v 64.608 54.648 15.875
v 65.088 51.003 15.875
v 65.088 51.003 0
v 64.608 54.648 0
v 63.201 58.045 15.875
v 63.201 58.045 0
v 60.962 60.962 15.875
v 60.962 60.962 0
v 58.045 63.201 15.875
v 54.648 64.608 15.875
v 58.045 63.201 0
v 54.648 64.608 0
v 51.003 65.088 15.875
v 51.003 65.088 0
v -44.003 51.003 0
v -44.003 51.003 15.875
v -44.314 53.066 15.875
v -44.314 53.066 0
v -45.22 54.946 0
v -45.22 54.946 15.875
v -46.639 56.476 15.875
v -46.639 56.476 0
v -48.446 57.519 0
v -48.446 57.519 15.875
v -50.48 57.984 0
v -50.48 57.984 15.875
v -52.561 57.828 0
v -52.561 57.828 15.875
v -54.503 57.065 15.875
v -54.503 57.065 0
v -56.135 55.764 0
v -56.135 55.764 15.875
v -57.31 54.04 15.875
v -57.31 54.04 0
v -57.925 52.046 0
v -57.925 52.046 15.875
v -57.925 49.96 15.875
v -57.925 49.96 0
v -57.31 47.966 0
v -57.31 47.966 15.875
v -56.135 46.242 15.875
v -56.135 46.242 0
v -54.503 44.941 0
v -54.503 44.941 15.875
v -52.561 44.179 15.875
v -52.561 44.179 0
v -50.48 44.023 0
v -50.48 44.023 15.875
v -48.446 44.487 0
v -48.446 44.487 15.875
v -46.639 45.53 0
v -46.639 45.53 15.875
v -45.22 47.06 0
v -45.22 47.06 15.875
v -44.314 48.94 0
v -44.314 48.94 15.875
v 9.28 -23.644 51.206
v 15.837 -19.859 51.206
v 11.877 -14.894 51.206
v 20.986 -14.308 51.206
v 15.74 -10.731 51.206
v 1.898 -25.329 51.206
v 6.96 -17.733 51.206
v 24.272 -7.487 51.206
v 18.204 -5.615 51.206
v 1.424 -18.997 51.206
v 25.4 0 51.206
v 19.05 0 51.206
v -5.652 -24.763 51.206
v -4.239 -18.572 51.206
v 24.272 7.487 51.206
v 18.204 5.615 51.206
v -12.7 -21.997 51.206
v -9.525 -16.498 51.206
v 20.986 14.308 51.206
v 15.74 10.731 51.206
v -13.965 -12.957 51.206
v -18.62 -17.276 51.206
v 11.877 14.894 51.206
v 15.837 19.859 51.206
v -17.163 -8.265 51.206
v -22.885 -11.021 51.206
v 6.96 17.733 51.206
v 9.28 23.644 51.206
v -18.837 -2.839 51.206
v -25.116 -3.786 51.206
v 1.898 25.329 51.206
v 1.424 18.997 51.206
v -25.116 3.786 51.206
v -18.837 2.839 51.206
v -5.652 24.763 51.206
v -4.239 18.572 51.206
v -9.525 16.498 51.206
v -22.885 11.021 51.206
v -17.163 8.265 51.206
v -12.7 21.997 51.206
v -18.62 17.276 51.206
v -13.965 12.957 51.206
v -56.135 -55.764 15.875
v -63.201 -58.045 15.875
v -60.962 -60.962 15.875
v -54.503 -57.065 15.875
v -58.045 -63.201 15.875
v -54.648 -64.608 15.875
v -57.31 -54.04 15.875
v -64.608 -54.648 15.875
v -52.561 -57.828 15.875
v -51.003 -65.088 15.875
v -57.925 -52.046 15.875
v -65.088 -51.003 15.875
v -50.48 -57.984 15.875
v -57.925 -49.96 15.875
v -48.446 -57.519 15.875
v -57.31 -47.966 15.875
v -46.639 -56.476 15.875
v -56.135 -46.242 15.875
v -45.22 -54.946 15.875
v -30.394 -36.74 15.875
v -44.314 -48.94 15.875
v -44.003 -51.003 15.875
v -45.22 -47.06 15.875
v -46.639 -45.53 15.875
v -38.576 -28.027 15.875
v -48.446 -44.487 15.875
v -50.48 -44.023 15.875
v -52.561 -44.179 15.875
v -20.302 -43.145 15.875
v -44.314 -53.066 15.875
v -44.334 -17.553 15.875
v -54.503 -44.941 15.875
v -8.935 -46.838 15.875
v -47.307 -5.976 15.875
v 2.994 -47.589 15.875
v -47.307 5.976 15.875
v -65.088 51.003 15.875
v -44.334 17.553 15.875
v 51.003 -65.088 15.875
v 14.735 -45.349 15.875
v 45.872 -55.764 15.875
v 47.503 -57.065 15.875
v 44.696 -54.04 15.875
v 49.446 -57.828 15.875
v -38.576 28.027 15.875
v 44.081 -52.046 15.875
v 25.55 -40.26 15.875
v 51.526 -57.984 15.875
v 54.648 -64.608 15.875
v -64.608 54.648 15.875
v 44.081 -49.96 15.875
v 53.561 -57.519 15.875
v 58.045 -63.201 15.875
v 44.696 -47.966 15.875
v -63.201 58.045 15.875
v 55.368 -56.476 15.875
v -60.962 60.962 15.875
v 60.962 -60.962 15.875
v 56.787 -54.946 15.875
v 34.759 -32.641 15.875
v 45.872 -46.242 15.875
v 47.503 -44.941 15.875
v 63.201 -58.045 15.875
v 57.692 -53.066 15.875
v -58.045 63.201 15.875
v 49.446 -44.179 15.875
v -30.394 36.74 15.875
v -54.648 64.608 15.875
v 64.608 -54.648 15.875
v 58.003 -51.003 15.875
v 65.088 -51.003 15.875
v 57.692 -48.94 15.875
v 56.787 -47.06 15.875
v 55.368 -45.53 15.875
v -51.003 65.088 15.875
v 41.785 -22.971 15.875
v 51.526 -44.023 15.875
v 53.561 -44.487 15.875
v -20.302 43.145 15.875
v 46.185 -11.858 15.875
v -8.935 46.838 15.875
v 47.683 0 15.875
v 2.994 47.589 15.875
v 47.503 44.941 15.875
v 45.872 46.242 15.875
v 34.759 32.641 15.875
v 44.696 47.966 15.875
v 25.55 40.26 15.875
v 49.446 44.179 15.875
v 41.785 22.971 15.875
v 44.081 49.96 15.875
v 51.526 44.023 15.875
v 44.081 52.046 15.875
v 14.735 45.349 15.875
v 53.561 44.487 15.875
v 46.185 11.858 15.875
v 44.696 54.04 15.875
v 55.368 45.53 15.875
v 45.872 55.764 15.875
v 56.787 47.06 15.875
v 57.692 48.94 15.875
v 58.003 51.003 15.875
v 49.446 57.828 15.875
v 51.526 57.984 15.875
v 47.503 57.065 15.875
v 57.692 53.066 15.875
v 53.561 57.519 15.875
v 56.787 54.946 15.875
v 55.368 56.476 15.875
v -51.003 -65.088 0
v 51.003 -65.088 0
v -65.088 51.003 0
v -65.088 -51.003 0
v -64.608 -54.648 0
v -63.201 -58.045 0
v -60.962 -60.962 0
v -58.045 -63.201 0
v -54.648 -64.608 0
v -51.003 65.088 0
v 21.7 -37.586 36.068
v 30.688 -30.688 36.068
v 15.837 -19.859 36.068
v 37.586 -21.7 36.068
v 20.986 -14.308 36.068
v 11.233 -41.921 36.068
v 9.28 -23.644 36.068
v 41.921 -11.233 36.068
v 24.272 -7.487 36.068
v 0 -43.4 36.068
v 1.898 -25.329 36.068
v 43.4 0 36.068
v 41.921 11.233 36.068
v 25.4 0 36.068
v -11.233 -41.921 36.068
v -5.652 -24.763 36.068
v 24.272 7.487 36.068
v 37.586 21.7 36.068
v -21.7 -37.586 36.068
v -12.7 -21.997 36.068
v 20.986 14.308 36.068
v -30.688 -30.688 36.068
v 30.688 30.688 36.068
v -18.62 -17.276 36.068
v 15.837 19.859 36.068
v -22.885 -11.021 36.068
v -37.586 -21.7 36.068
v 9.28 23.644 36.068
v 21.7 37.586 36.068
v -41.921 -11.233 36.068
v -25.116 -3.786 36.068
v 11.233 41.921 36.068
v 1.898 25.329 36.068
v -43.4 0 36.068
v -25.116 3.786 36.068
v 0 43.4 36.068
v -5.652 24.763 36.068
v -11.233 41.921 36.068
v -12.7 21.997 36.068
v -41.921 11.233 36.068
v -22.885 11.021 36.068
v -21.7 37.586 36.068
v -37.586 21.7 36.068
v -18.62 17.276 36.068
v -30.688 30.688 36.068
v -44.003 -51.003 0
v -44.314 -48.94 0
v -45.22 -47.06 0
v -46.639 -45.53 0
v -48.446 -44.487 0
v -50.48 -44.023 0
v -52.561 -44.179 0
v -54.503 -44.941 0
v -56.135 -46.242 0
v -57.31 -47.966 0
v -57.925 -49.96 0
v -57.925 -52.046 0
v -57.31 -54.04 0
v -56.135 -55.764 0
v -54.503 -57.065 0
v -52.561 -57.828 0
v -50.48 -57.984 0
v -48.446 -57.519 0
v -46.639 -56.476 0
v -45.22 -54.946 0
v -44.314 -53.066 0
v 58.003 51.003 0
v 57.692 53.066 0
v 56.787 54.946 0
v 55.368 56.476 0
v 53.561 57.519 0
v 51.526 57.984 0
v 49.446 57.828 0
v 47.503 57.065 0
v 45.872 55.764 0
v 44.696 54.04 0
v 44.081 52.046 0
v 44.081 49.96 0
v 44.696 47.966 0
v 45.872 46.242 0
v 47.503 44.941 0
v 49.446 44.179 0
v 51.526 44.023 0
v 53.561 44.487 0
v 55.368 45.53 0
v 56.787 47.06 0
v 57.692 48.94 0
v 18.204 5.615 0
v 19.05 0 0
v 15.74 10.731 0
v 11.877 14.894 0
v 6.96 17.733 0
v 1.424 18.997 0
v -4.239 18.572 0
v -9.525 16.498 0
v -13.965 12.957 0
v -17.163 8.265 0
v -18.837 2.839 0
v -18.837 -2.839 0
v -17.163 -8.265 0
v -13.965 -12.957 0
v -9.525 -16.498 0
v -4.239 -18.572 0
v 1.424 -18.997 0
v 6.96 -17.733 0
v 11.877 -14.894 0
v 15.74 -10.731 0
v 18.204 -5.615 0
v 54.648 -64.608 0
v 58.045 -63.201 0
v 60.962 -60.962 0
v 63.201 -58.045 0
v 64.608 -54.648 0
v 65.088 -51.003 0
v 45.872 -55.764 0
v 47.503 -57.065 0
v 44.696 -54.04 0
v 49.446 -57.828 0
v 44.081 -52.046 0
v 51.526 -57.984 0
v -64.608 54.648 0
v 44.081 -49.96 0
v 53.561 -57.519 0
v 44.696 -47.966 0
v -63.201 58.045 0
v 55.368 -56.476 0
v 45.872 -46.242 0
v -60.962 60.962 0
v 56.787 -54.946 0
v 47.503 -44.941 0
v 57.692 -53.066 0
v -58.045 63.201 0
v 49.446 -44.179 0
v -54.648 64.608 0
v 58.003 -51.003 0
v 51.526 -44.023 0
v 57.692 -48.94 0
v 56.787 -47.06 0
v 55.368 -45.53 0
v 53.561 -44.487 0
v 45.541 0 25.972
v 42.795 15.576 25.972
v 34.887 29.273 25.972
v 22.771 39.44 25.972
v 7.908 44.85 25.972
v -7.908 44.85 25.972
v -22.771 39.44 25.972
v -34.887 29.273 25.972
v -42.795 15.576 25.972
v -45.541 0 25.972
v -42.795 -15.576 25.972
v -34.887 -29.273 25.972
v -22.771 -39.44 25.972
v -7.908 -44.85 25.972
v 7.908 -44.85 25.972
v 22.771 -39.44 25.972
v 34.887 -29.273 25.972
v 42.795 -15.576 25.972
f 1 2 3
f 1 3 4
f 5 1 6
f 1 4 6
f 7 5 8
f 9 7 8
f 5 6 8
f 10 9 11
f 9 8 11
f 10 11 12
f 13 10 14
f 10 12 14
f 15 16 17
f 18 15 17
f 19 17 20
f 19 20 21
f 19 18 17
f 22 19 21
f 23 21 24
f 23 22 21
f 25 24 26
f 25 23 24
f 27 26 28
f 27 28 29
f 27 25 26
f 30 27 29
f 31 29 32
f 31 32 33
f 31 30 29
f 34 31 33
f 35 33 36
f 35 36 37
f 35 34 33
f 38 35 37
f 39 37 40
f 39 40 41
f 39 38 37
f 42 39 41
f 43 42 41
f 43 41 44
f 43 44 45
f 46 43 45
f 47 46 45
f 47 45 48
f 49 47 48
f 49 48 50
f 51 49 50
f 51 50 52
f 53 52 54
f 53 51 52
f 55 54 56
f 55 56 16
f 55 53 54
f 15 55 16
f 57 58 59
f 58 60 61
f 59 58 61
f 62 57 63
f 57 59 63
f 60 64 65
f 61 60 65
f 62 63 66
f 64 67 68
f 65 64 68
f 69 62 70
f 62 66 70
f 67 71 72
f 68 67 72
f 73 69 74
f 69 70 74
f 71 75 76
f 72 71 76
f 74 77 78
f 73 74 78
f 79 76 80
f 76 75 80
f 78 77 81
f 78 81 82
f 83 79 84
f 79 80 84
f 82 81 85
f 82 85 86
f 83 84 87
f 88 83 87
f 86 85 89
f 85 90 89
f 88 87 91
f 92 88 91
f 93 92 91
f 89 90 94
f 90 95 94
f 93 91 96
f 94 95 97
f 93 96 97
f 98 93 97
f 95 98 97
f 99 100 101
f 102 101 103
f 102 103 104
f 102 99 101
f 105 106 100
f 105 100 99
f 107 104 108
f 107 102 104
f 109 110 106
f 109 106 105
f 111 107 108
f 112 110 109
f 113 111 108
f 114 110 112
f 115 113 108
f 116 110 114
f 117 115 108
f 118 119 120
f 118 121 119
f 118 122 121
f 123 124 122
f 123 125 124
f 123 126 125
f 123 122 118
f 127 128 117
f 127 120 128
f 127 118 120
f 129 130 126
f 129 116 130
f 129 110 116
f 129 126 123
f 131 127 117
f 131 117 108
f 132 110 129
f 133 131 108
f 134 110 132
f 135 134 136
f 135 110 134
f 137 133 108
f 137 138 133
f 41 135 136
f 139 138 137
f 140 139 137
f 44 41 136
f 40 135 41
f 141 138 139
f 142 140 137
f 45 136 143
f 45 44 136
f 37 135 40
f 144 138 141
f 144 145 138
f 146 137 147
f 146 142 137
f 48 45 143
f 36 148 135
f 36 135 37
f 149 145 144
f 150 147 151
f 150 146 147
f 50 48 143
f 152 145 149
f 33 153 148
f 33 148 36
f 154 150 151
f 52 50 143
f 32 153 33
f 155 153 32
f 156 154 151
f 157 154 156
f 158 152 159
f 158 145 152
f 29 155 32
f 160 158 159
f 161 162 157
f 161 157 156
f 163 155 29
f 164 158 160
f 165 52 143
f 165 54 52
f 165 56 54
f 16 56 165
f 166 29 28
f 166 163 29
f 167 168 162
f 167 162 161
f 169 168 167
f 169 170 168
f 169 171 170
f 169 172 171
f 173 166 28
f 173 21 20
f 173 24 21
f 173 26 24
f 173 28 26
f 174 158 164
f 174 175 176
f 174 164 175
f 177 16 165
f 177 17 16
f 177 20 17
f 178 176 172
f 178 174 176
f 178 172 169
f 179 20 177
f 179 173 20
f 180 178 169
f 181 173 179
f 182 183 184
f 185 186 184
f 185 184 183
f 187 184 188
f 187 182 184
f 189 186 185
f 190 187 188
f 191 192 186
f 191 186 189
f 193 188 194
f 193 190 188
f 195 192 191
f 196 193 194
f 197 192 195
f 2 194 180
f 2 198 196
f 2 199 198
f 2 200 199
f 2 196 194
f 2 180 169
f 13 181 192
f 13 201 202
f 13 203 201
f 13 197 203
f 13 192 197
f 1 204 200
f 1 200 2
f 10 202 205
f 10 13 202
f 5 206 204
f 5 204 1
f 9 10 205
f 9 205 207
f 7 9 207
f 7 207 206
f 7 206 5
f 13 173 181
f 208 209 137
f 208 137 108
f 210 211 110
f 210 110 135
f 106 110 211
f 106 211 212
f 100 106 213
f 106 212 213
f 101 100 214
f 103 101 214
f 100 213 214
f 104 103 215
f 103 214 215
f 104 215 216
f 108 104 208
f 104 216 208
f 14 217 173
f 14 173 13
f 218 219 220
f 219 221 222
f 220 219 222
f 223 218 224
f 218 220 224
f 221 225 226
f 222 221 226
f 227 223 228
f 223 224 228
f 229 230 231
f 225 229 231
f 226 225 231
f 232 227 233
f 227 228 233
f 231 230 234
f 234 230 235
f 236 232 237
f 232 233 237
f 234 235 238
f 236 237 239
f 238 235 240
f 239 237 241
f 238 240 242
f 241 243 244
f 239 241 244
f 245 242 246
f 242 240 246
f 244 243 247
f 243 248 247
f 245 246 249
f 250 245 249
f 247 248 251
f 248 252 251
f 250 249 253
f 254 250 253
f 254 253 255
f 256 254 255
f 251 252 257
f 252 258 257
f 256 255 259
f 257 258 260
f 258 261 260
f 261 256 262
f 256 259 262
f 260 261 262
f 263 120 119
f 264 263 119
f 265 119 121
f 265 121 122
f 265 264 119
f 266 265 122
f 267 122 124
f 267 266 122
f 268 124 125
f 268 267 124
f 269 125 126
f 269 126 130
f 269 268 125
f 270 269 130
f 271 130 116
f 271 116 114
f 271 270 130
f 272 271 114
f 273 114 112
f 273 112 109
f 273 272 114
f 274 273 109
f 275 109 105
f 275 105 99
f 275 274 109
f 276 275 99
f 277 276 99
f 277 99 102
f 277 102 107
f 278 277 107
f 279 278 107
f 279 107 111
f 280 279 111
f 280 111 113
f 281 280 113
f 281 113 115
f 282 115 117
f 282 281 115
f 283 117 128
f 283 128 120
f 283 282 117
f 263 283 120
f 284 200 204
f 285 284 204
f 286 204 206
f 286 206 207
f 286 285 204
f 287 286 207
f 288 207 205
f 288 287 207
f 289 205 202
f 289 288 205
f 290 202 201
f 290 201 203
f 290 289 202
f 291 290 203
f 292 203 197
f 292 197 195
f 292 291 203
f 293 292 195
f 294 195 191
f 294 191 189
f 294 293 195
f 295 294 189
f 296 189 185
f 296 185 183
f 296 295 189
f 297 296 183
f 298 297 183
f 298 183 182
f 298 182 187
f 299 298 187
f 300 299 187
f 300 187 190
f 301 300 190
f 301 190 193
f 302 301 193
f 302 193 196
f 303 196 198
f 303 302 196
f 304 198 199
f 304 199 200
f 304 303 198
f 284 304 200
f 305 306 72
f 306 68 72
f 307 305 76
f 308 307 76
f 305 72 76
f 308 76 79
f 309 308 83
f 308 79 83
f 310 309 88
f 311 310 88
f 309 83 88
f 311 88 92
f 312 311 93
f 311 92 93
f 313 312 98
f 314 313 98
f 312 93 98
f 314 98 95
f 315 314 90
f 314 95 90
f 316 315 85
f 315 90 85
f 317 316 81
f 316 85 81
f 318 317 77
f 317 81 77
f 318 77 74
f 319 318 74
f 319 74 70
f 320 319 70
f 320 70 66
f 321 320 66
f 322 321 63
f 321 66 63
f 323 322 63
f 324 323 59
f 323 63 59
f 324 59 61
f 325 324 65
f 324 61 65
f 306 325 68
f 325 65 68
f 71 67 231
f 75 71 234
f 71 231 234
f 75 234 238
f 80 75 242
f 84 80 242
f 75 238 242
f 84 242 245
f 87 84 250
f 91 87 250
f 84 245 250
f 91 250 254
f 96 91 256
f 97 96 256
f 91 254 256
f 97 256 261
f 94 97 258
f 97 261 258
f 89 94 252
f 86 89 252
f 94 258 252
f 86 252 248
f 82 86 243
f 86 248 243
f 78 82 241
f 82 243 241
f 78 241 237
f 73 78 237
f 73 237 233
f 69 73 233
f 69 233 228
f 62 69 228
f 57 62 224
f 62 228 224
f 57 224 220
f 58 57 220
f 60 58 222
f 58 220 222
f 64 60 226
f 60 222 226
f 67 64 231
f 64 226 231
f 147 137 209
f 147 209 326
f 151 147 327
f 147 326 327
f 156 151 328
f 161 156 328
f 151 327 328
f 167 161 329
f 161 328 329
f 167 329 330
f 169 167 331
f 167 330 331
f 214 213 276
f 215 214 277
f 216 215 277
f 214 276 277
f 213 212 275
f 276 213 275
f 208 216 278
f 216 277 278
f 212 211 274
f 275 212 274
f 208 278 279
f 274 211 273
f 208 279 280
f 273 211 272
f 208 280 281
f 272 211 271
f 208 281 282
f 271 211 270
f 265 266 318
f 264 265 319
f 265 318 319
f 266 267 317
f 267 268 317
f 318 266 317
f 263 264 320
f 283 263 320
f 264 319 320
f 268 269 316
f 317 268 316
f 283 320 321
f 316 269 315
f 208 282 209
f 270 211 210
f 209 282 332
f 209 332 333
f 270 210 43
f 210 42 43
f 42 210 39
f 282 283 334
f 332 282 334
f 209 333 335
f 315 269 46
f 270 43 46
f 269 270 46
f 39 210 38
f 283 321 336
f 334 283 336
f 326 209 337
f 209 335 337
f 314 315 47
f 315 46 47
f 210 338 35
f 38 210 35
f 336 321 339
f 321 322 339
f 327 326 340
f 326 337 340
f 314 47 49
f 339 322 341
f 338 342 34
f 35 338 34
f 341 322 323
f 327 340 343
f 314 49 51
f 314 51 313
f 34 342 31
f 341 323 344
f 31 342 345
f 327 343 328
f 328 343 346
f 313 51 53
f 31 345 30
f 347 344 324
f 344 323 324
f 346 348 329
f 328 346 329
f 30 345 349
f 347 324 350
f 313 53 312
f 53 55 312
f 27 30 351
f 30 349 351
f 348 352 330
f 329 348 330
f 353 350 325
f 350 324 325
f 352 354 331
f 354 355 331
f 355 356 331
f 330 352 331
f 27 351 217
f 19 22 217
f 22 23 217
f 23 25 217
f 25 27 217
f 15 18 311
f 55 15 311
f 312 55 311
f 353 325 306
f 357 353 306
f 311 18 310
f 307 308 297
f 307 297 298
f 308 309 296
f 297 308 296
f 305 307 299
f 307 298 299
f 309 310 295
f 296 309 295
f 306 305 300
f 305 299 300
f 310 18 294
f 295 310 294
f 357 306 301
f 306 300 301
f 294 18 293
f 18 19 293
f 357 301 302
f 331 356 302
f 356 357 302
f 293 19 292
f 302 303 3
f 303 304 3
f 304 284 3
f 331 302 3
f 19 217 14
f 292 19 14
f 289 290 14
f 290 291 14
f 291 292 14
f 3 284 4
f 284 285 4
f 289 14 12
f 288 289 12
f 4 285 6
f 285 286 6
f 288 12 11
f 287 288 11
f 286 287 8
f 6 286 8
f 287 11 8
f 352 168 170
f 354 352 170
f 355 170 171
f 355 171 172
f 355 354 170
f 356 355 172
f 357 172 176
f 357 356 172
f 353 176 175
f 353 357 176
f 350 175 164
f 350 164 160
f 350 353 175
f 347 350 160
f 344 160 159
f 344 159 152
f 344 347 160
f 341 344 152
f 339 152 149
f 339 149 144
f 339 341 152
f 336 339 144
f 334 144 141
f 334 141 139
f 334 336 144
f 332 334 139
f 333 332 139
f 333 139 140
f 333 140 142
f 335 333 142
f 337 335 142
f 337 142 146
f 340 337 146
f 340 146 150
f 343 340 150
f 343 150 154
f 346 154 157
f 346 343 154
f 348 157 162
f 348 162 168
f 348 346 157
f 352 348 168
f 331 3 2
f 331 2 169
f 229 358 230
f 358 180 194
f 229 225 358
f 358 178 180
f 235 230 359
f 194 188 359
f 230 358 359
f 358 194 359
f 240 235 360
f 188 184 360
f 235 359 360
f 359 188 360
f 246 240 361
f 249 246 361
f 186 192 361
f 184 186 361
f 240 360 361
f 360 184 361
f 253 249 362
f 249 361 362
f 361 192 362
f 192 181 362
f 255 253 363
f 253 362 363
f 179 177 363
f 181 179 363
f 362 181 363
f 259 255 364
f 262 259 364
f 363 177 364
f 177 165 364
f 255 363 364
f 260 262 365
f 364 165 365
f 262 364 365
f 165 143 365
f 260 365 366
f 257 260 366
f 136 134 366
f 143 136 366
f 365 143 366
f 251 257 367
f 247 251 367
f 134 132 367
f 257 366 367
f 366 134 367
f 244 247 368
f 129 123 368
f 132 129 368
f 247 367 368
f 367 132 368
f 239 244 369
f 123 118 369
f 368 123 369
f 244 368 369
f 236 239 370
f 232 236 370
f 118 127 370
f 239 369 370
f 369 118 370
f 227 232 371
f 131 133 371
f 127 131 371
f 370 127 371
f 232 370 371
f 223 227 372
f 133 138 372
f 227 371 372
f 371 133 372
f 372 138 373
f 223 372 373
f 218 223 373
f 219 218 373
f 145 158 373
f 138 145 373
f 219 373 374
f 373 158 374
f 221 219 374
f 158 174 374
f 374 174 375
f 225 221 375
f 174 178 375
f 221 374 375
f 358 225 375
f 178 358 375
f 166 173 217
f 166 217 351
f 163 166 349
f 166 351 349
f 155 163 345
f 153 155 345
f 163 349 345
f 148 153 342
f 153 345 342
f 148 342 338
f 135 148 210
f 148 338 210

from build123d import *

# Parameters (mm, degrees)
SKETCH001_R   = 7
SKETCH001_R_2 = 19.05
PAD_DEPTH     = 15.875


with BuildPart() as part:
    # Sketch → Revolution (revolve)
    with BuildSketch(Plane.XZ):
        Polygon((19.05, 0), (19.05, 51.2064), (25.4, 51.2064), (25.4, 36.068), (43.4, 36.068), (51.05, 0), align=None)
    revolve(axis=Axis((0, 0, 0), (0, 0, 1)))

    # Sketch001 → Pad (new body)
    with BuildSketch(Plane.XY):
        with BuildLine():
            ThreePointArc((-51.0032, 65.0875), (-60.962304, 60.962304), (-65.0875, 51.0032))
            Line((-65.0875, -51.0032), (-65.0875, 51.0032))
            ThreePointArc((-65.0875, -51.0032), (-60.962304, -60.962304), (-51.0032, -65.0875))
            Line((51.0032, -65.0875), (-51.0032, -65.0875))
            ThreePointArc((51.0032, -65.0875), (60.962304, -60.962304), (65.0875, -51.0032))
            Line((65.0875, 51.0032), (65.0875, -51.0032))
            ThreePointArc((65.0875, 51.0032), (60.962304, 60.962304), (51.0032, 65.0875))
            Line((-51.0032, 65.0875), (51.0032, 65.0875))
        make_face()
        with Locations((51.0032, 51.0032)):
            Circle(SKETCH001_R, mode=Mode.SUBTRACT)
        with Locations((-51.0032, 51.0032)):
            Circle(SKETCH001_R, mode=Mode.SUBTRACT)
        with Locations((-51.0032, -51.0032)):
            Circle(SKETCH001_R, mode=Mode.SUBTRACT)
        with Locations((51.0032, -51.0032)):
            Circle(SKETCH001_R, mode=Mode.SUBTRACT)
        Circle(SKETCH001_R_2, mode=Mode.SUBTRACT)
    extrude(amount=PAD_DEPTH)


solid = part.part
